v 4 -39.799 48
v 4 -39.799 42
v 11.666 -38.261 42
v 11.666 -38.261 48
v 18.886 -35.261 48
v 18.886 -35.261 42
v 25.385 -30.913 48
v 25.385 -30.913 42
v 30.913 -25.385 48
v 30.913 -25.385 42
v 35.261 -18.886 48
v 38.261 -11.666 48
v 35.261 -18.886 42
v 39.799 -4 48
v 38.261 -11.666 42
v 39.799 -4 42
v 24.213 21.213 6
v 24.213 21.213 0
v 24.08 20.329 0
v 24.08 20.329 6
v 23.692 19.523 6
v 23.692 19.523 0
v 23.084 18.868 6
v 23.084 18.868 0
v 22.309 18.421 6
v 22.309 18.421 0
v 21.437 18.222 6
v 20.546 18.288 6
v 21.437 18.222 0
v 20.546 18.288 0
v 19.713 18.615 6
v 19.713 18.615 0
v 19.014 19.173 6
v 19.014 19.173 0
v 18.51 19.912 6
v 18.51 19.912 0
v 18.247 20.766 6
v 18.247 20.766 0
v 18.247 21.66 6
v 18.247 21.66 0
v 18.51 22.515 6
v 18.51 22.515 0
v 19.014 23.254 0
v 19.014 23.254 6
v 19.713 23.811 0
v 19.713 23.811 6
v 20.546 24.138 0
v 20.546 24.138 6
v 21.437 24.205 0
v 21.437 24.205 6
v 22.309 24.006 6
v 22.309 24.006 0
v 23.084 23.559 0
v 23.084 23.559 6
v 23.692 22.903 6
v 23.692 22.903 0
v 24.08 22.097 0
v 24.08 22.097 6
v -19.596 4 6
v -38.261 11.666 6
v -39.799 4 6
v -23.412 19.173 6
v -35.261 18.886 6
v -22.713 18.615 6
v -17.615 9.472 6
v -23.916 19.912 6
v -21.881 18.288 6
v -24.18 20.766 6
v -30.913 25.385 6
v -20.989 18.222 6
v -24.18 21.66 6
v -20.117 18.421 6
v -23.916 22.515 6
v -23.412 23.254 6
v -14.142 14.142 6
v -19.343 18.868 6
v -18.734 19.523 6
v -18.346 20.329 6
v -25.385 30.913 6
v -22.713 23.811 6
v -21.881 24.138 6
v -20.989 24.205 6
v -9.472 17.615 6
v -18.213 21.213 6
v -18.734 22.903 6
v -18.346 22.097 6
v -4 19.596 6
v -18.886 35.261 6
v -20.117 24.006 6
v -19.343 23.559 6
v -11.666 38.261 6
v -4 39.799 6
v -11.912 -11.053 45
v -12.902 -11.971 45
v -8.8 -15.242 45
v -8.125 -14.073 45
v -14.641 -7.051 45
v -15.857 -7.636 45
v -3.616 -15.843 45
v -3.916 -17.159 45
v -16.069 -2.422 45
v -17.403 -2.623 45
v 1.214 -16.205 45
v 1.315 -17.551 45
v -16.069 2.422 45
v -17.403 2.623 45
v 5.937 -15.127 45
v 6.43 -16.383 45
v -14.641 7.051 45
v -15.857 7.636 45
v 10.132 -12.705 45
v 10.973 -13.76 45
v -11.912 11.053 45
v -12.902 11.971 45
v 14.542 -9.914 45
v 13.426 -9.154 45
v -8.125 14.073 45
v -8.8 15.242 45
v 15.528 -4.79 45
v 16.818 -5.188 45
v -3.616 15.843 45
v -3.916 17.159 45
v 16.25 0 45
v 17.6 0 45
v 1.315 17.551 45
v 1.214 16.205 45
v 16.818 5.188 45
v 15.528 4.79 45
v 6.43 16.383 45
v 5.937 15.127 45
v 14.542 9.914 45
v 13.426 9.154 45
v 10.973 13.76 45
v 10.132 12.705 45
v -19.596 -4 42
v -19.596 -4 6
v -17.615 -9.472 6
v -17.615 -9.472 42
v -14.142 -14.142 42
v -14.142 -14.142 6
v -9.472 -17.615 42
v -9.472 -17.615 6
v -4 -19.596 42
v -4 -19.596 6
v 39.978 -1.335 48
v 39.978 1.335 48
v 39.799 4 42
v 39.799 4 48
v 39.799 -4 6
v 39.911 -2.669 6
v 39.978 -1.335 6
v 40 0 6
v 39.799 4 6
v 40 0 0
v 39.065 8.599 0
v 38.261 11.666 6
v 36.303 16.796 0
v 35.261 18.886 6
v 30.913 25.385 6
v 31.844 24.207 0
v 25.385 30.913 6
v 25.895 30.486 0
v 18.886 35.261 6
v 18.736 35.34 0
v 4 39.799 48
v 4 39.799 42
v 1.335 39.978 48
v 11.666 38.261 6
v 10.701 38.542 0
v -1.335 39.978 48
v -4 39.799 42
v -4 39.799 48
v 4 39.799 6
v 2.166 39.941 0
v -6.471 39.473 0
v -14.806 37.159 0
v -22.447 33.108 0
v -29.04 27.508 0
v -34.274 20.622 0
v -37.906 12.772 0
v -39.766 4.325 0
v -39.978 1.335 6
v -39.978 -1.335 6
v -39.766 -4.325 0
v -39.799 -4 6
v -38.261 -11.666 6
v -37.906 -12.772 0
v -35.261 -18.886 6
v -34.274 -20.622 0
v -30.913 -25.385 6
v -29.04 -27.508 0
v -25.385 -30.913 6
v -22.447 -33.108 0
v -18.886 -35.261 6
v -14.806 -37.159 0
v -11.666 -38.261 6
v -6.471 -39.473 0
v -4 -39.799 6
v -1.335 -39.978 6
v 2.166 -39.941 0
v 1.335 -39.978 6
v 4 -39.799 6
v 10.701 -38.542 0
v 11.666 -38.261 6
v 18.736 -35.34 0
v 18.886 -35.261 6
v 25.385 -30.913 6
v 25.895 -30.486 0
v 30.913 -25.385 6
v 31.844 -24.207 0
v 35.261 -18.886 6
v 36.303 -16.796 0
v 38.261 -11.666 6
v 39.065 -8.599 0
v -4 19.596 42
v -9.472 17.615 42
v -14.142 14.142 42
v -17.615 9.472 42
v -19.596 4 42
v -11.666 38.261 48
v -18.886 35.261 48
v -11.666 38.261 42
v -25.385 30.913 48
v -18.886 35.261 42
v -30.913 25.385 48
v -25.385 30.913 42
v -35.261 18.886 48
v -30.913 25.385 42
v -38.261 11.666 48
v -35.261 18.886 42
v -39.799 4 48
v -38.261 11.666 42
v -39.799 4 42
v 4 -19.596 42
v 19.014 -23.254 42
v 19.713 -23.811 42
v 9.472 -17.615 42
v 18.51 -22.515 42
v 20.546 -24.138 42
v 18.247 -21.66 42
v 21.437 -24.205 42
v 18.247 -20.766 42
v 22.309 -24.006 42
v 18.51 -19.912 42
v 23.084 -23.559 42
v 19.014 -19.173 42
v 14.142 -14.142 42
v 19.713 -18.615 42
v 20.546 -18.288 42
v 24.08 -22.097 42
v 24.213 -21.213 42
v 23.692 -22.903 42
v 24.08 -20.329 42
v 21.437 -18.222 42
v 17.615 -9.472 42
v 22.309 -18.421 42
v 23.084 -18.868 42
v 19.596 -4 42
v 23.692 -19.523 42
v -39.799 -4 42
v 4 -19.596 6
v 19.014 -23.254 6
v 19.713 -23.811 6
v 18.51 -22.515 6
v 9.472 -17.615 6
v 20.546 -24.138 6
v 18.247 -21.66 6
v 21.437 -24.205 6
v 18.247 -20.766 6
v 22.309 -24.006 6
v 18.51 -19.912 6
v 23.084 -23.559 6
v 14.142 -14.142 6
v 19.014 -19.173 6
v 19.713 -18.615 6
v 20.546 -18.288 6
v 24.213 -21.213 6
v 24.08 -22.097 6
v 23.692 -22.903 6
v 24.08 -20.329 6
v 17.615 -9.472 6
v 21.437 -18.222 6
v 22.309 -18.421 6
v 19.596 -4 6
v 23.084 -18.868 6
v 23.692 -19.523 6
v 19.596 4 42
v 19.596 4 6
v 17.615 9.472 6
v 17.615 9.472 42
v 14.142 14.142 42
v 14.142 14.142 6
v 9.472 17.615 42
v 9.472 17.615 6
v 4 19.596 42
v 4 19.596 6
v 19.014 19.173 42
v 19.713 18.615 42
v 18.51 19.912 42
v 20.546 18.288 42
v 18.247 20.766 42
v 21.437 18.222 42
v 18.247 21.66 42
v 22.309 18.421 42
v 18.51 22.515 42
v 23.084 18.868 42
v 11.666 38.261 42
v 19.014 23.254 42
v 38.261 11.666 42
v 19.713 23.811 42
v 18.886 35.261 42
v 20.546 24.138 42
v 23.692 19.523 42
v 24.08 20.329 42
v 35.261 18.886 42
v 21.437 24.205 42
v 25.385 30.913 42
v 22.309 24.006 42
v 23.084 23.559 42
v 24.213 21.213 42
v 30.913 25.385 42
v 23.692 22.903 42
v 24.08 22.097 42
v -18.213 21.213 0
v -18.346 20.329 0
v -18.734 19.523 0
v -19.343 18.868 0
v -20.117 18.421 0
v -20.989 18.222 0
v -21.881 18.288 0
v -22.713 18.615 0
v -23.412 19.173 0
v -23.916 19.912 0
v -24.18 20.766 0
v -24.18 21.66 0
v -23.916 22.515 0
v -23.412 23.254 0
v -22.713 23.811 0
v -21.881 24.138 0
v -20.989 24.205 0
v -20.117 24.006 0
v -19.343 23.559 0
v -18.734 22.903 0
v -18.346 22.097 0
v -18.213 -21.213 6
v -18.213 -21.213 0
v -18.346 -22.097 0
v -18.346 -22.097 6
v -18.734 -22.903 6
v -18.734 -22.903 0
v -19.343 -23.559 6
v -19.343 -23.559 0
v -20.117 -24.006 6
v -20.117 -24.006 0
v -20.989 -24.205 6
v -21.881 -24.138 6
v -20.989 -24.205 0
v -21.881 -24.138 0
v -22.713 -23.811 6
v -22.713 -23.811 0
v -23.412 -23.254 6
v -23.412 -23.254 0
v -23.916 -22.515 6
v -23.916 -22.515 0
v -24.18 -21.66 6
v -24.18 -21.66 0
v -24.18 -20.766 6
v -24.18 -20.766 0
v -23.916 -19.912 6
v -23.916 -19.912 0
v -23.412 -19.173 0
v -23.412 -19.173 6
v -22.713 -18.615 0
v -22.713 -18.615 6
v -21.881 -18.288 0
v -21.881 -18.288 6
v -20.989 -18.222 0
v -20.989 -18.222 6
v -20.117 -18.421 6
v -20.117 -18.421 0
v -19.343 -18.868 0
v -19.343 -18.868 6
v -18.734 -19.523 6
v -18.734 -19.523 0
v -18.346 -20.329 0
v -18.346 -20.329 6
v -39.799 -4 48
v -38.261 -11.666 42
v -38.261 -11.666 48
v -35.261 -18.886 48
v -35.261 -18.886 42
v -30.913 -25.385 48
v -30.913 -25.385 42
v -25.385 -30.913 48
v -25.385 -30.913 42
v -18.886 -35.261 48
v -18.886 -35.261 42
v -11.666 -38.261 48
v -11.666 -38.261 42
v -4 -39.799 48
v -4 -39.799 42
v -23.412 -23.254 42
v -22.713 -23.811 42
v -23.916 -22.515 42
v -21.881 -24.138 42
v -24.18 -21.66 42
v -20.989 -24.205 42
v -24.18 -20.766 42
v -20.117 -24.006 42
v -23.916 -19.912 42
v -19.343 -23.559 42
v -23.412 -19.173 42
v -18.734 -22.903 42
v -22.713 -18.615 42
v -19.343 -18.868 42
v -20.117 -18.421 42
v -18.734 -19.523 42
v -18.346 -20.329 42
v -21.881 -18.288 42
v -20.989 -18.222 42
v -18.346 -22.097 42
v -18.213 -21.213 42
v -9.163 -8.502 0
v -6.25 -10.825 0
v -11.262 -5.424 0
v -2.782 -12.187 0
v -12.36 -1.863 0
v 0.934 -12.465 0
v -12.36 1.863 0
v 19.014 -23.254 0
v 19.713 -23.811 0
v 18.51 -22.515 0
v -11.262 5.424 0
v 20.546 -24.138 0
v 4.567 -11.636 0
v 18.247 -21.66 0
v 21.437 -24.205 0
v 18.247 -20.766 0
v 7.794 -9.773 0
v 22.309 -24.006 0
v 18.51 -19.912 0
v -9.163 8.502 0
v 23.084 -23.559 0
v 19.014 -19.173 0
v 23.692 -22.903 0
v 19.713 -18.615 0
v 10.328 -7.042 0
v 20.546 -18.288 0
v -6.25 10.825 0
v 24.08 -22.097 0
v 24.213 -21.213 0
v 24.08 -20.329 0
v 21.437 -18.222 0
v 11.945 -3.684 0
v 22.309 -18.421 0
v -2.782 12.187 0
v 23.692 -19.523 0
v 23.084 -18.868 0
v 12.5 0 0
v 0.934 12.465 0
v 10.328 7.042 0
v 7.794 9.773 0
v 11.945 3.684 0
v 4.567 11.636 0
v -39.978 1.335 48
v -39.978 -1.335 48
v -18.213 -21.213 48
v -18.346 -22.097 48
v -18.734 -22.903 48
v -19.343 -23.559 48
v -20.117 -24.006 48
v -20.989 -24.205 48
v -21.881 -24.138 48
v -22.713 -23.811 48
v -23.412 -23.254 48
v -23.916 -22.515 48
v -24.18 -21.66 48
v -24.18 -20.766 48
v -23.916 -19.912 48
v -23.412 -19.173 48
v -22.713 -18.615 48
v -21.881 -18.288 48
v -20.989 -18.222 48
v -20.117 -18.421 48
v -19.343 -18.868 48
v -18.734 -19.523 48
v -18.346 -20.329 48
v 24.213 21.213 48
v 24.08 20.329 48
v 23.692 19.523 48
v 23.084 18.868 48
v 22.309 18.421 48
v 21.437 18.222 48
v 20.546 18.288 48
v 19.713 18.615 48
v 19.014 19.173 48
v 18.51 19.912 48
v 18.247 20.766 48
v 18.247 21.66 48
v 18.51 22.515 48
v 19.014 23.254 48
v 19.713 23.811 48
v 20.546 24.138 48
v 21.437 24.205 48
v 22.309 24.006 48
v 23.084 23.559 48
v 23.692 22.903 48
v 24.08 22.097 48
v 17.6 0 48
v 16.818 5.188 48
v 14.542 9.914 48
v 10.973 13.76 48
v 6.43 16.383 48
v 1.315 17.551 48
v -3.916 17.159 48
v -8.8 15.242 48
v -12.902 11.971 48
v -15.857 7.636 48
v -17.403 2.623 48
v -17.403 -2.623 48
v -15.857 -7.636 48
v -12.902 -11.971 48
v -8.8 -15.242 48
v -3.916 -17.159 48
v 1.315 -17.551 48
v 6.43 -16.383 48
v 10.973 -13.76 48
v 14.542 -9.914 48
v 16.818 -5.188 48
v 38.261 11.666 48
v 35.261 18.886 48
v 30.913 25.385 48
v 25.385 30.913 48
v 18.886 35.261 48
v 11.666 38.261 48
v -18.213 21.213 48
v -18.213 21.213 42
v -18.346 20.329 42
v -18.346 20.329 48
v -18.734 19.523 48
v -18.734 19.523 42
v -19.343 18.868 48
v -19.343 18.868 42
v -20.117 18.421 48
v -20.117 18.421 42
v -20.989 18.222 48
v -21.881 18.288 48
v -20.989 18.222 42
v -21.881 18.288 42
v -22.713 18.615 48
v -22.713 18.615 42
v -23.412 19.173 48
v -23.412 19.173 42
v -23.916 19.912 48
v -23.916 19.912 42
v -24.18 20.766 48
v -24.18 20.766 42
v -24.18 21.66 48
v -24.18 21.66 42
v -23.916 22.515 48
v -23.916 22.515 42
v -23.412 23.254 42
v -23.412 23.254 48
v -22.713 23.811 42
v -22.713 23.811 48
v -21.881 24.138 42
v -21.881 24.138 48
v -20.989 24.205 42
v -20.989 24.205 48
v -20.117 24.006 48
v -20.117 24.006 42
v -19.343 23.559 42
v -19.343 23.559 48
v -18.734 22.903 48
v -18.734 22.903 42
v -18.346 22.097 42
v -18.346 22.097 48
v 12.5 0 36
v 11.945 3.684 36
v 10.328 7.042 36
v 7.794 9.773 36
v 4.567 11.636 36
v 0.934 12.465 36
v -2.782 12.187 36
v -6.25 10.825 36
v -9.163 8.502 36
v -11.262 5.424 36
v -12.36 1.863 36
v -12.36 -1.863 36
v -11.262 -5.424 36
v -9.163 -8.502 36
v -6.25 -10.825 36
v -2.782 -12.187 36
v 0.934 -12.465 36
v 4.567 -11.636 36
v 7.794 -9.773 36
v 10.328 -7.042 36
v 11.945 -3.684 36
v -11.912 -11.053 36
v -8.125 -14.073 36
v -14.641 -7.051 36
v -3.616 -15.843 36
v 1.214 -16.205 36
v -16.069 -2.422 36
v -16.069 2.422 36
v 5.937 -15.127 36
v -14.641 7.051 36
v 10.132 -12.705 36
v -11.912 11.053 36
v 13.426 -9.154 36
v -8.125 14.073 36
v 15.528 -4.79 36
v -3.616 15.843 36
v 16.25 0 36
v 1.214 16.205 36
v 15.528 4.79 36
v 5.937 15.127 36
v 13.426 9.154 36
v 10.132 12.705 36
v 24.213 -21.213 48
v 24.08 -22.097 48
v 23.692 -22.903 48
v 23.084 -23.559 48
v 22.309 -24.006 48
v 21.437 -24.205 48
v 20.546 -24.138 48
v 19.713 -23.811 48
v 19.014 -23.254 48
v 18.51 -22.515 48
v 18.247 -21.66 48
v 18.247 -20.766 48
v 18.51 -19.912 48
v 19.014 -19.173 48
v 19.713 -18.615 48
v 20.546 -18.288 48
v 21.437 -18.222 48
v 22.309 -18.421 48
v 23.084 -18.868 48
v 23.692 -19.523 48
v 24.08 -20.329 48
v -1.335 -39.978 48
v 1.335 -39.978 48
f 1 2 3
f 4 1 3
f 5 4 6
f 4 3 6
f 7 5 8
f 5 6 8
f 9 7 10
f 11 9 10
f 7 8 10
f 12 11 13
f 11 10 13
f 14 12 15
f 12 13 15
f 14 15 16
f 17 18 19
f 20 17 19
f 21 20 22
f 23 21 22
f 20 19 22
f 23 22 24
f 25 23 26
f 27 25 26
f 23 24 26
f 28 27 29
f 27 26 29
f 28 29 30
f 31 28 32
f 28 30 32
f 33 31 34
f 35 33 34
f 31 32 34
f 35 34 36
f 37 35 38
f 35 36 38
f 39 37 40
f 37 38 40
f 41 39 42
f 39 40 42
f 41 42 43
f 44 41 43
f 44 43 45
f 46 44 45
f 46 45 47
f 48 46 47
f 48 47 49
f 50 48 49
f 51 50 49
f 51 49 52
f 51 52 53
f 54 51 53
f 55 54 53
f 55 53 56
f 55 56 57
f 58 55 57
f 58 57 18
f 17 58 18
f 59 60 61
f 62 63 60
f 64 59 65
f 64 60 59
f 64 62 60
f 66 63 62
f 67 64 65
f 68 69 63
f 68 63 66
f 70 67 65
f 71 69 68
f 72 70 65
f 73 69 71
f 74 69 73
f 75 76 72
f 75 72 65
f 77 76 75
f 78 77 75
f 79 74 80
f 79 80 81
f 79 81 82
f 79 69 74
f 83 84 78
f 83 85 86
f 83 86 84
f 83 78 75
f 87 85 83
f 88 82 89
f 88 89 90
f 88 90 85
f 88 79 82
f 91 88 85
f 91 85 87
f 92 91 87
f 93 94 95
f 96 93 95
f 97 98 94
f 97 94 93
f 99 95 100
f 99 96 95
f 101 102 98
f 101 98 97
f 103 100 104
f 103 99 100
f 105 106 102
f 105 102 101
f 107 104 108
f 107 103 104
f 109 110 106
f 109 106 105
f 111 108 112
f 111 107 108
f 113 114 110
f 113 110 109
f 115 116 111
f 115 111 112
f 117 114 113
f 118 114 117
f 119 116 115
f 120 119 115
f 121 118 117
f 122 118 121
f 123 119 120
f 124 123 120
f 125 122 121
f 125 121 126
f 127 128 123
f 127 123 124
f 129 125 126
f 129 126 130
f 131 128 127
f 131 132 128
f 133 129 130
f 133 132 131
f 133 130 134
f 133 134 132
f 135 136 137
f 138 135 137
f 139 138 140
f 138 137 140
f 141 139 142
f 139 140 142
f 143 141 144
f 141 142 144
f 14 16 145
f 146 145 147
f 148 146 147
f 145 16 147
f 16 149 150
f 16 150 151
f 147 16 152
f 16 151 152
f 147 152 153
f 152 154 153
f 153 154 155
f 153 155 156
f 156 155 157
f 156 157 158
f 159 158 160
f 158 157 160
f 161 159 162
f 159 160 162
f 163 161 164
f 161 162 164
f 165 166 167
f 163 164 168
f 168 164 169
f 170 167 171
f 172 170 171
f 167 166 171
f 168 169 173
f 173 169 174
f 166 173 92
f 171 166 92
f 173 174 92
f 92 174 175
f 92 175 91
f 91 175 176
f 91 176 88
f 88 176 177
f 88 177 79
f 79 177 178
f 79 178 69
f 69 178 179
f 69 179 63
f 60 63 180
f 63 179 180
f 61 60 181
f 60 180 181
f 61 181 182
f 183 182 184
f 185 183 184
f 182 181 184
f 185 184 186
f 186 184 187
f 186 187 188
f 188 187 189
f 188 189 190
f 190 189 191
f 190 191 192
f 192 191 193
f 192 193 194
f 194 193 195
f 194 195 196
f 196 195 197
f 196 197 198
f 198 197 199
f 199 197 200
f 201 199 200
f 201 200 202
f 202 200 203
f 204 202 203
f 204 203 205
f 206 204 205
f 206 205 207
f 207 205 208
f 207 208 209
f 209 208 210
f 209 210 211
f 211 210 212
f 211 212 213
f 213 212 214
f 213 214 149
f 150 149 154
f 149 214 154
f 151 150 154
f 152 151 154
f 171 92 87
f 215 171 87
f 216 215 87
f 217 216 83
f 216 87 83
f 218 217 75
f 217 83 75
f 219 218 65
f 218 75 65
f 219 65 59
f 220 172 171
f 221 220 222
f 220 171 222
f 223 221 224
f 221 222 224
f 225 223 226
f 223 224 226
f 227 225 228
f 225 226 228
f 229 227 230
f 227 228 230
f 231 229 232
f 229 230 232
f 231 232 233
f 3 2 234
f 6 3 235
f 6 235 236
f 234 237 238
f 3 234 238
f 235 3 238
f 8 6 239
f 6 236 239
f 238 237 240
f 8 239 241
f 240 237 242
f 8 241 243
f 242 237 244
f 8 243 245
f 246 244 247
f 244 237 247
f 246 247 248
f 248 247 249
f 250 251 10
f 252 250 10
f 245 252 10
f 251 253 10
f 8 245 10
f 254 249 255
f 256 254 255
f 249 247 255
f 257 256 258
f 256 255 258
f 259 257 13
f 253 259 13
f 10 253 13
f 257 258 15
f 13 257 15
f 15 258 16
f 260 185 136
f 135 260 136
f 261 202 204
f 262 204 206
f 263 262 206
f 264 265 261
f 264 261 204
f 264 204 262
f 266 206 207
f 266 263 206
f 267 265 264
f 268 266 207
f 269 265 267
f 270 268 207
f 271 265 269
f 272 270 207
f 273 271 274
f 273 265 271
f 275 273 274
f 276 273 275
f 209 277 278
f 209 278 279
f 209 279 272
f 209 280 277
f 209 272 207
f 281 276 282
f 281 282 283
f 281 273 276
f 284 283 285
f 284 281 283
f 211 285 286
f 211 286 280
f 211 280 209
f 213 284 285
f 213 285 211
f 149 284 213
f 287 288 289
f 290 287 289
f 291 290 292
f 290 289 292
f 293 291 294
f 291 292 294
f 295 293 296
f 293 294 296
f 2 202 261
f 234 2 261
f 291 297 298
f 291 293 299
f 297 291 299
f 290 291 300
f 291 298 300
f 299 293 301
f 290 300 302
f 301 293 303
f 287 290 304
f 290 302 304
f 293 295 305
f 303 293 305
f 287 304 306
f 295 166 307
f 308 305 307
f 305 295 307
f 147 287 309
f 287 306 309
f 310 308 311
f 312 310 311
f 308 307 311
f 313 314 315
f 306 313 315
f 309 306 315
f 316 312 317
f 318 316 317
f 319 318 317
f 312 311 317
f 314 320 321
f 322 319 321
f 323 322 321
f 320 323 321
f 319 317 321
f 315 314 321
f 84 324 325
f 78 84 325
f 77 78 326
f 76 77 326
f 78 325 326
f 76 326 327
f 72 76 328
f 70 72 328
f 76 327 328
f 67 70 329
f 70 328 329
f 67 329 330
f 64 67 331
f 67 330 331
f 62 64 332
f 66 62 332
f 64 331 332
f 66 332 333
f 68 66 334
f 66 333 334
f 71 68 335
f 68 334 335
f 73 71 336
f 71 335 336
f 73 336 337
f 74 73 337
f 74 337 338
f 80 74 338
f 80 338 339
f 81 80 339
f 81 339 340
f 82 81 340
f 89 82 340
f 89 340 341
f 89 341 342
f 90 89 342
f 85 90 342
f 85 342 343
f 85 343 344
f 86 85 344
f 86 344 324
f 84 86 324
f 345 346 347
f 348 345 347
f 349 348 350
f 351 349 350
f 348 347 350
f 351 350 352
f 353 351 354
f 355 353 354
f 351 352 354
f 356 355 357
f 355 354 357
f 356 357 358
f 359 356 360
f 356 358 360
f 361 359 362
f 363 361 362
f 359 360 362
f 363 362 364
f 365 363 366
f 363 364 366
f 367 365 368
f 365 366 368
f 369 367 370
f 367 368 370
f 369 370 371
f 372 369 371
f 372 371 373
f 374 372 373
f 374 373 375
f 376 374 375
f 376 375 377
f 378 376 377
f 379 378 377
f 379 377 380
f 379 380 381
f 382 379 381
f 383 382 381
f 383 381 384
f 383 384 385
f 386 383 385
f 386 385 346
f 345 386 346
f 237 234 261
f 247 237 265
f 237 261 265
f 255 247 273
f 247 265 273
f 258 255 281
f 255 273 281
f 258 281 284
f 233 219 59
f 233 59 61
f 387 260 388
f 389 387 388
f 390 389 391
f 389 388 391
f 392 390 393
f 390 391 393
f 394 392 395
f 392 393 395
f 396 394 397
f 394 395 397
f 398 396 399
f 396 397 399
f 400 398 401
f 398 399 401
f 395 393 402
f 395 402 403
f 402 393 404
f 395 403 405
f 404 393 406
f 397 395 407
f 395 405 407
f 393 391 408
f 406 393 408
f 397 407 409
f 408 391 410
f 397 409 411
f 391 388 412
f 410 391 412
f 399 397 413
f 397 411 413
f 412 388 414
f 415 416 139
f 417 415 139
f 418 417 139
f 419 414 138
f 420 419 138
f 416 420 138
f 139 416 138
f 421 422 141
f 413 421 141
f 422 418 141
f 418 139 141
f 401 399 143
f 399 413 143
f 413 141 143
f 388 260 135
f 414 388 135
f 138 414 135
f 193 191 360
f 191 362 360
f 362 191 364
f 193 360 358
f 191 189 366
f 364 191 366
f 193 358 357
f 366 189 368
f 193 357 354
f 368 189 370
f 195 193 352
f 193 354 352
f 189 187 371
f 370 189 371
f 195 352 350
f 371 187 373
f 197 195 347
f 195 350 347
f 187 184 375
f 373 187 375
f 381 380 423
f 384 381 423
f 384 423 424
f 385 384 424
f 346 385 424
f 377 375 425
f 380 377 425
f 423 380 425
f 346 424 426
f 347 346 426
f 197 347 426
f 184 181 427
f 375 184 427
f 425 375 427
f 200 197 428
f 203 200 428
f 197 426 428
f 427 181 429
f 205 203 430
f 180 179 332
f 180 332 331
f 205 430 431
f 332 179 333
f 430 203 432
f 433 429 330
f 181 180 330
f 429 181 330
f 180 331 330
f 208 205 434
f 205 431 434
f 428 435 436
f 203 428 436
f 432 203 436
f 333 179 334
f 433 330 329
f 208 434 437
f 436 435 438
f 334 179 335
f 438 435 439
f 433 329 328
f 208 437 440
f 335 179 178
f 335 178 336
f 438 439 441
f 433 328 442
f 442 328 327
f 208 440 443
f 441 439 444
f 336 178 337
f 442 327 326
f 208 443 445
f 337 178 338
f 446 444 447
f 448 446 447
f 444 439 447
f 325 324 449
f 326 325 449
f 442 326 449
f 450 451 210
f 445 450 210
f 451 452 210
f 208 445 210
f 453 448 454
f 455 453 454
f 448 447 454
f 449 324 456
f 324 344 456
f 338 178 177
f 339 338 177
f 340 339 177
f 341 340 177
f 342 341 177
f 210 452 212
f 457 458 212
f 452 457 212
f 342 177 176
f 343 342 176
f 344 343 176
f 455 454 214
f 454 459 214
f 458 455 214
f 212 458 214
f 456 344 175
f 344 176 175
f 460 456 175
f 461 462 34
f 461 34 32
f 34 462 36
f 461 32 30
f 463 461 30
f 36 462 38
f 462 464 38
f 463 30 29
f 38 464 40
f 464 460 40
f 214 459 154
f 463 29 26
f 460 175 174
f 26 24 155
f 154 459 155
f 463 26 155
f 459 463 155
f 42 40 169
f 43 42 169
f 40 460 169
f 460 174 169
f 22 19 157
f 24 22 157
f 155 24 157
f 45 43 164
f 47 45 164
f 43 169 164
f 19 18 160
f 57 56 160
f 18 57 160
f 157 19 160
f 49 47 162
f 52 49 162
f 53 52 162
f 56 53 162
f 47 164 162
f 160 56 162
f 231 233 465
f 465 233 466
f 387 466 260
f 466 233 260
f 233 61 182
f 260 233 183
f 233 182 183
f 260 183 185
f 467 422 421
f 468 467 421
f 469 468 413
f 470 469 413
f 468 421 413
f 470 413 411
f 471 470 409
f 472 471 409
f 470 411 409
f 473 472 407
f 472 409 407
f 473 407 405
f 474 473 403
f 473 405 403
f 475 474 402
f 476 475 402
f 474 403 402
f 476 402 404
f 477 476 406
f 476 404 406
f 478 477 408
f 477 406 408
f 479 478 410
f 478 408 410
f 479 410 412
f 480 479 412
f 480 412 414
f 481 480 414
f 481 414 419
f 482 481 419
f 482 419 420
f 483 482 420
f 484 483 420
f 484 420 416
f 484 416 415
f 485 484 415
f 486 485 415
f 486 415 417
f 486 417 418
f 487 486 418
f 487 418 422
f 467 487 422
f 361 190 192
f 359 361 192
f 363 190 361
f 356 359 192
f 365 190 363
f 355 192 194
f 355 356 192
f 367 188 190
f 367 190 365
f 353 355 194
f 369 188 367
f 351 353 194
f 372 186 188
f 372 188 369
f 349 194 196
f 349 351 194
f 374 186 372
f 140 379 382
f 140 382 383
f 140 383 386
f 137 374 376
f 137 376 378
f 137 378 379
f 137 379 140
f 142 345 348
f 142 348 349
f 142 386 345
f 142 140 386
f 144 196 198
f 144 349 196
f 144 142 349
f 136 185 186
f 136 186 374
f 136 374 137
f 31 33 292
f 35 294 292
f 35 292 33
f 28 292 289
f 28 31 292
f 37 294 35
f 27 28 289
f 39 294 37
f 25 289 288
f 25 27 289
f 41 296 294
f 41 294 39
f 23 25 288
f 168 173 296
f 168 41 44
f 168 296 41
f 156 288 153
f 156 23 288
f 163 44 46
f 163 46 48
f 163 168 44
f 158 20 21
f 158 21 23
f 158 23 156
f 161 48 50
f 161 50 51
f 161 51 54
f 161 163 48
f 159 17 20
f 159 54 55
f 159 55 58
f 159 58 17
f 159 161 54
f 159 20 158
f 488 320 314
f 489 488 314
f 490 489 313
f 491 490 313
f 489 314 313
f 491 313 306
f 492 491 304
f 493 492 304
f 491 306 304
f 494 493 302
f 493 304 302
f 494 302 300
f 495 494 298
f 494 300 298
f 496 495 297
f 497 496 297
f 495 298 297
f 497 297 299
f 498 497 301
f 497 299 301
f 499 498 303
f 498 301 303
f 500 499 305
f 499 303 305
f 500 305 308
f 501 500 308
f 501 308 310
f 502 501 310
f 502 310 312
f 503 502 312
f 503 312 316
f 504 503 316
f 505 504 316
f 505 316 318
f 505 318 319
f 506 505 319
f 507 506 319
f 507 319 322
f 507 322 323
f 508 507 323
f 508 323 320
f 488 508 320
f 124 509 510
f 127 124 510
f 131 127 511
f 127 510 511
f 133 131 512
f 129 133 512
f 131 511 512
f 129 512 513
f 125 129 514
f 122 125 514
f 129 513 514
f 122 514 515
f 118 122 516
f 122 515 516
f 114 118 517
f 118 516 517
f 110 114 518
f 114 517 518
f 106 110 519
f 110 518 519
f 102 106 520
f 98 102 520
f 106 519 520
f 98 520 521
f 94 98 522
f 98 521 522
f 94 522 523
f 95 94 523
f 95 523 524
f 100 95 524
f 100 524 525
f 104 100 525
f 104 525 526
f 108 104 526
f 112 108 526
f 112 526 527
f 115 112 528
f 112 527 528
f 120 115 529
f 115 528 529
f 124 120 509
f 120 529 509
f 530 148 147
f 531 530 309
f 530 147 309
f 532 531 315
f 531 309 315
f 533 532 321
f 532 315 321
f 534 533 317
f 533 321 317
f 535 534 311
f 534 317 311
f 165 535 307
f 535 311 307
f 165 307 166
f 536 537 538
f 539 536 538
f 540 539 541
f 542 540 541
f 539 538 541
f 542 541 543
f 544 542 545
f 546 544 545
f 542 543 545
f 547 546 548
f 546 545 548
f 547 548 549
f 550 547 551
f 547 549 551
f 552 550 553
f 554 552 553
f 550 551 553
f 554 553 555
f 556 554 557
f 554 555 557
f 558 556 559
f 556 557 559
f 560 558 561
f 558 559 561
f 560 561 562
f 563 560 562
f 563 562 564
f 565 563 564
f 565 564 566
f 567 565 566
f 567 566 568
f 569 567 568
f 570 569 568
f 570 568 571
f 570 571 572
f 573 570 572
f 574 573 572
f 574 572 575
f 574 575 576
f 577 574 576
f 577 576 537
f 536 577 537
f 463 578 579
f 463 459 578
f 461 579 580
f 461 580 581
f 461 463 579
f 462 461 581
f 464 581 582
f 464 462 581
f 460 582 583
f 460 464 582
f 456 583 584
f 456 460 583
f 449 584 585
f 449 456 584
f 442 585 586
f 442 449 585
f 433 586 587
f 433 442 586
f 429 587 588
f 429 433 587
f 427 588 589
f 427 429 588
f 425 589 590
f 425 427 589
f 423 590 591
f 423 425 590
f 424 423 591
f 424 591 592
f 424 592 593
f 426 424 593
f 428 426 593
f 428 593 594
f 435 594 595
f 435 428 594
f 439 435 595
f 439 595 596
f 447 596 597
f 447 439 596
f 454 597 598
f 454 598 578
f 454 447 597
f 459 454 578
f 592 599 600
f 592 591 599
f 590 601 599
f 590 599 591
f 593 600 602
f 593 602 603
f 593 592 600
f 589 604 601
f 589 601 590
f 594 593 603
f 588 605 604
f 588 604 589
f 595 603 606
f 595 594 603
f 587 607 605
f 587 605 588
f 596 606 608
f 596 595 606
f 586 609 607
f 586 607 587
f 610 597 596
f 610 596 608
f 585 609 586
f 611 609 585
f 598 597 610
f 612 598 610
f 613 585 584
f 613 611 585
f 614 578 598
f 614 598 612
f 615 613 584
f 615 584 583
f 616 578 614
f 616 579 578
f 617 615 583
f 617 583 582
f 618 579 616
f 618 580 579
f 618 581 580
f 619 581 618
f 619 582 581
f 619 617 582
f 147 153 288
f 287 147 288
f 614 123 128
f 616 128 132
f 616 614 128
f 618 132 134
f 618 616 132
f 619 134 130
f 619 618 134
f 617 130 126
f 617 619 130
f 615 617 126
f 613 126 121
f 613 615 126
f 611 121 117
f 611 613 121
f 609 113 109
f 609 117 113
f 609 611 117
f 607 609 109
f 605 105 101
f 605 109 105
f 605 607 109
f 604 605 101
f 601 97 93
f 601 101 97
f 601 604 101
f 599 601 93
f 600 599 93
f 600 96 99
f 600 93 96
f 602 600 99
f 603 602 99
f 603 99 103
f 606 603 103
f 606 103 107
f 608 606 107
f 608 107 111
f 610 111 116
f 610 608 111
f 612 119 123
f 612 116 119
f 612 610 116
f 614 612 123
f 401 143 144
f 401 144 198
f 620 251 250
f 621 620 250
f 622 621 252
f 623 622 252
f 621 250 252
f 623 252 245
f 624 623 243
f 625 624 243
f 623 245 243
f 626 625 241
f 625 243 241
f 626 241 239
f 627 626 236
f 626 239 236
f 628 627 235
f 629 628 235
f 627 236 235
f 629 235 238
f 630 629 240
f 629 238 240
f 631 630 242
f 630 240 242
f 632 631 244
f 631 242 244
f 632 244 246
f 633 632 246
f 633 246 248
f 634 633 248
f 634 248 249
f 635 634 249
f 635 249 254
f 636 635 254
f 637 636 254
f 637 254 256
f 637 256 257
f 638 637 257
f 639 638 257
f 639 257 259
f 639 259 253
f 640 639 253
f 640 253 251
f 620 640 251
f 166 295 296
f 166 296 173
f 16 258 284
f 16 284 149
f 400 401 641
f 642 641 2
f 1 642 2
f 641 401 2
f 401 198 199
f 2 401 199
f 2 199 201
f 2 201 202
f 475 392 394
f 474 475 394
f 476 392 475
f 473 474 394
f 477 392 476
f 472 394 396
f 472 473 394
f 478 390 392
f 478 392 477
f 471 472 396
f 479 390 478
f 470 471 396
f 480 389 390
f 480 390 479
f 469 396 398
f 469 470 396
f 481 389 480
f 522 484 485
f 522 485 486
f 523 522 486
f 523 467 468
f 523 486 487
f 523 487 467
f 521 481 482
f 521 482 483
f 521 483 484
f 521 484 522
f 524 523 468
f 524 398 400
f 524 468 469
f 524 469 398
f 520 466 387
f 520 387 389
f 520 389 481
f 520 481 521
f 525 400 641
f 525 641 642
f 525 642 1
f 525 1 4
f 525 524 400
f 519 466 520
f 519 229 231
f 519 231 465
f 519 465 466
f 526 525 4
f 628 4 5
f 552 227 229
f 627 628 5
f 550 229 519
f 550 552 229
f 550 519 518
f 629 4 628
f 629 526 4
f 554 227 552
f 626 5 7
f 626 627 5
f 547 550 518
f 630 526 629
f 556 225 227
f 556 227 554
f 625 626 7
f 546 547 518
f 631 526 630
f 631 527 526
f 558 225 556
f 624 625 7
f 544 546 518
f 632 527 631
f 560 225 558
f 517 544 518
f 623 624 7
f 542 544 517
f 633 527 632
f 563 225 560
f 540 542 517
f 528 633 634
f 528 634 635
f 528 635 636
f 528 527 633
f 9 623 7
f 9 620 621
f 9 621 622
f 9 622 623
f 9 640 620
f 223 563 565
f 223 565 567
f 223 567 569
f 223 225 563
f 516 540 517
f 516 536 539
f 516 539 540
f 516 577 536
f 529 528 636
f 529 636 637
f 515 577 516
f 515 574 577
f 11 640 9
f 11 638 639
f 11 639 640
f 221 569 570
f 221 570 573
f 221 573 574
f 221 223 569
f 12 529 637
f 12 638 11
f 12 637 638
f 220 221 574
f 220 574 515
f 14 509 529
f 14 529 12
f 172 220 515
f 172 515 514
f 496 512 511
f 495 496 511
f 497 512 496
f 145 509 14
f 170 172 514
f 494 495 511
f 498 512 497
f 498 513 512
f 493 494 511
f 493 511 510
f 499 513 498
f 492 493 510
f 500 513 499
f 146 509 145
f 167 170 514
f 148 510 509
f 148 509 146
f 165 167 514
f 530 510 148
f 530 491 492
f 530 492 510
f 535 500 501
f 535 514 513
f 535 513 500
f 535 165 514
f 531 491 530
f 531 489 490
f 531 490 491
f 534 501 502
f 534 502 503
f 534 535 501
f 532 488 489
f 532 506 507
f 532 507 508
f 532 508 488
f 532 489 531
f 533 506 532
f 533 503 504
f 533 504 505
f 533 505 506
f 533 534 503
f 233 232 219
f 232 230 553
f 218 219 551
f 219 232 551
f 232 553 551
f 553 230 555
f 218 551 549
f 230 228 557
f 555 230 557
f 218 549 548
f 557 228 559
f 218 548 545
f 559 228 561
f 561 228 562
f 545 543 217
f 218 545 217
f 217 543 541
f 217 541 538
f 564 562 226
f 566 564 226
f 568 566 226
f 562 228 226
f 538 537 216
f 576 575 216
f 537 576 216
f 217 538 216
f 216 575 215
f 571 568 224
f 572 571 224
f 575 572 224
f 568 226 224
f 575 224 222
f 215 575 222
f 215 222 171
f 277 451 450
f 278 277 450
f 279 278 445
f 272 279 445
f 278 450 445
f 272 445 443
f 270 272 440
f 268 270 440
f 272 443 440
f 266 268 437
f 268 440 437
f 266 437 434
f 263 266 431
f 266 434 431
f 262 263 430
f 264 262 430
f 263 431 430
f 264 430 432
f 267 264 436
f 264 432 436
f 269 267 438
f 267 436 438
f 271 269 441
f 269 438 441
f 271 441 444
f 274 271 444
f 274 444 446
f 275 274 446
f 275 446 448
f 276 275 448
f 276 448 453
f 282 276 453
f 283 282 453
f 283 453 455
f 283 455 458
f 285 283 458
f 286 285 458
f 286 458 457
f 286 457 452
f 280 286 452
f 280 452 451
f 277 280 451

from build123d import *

# Parameters (mm, degrees)
SKETCH1_R            = 40
SKETCH1_R_2          = 12.5
BOSS_EXTRUDE1_DEPTH  = 6
SKETCH2_R            = 20
SKETCH2_R_2          = 12.5
BOSS_EXTRUDE2_DEPTH  = 30
SKETCH6_R            = 20
SKETCH6_R_2          = 16.25
BOSS_EXTRUDE5_DEPTH  = 12
BOSS_EXTRUDE6_DEPTH  = 42
SKETCH9_R            = 17.6
CUT_EXTRUDE1_DEPTH   = 3
BOSS_EXTRUDE14_START = -6
SKETCH11_R           = 40
SKETCH11_R_2         = 20
BOSS_EXTRUDE14_DEPTH = 6
SKETCH12_R           = 3
CUT_EXTRUDE2_DEPTH   = 78


with BuildPart() as part:
    # Sketch1 → Boss-Extrude1 (new body)
    with BuildSketch(Plane.XY):
        Circle(SKETCH1_R)
        Circle(SKETCH1_R_2, mode=Mode.SUBTRACT)
    extrude(amount=BOSS_EXTRUDE1_DEPTH)

    # Sketch2 → Boss-Extrude2 (add)
    with BuildSketch(Plane.XY.offset(6)):
        Circle(SKETCH2_R)
        Circle(SKETCH2_R_2, mode=Mode.SUBTRACT)
    extrude(amount=BOSS_EXTRUDE2_DEPTH)

    # Sketch6 → Boss-Extrude5 (add)
    with BuildSketch(Plane.XY.offset(36)):
        Circle(SKETCH6_R)
        Circle(SKETCH6_R_2, mode=Mode.SUBTRACT)
    extrude(amount=BOSS_EXTRUDE5_DEPTH)

    # Sketch8 → Boss-Extrude6 (add)
    with BuildSketch(Plane.XY.offset(6)):
        with BuildLine():
            Line((4, -39.799497484), (4, -19.595917942))
            ThreePointArc((4, -19.595917942), (0, -20), (-4, -19.595917942))
            Line((-4, -19.595917942), (-4, -39.799497484))
            ThreePointArc((-4, -39.799497484), (0, -40), (4, -39.799497484))
        make_face()
        with BuildLine():
            Line((39.799497484, 4), (19.595917942, 4))
            ThreePointArc((19.595917942, 4), (20, 0), (19.595917942, -4))
            Line((19.595917942, -4), (39.799497484, -4))
            ThreePointArc((39.799497484, -4), (40, 0), (39.799497484, 4))
        make_face()
        with BuildLine():
            Line((-39.799497484, -4), (-19.595917942, -4))
            ThreePointArc((-19.595917942, -4), (-20, 0), (-19.595917942, 4))
            Line((-19.595917942, 4), (-39.799497484, 4))
            ThreePointArc((-39.799497484, 4), (-40, 0), (-39.799497484, -4))
        make_face()
        with BuildLine():
            Line((-4, 39.799497484), (-4, 19.595917942))
            ThreePointArc((-4, 19.595917942), (0, 20), (4, 19.595917942))
            Line((4, 19.595917942), (4, 39.799497484))
            ThreePointArc((4, 39.799497484), (0, 40), (-4, 39.799497484))
        make_face()
    extrude(amount=BOSS_EXTRUDE6_DEPTH)

    # Sketch9 → Cut-Extrude1 (cut)
    with BuildSketch(Plane.XY.offset(48)):
        Circle(SKETCH9_R)
    extrude(amount=-CUT_EXTRUDE1_DEPTH, mode=Mode.SUBTRACT)

    # Sketch11 → Boss-Extrude14 (add)
    with BuildSketch(Plane.XY.offset(48).offset(BOSS_EXTRUDE14_START)):
        Circle(SKETCH11_R)
        Circle(SKETCH11_R_2, mode=Mode.SUBTRACT)
    extrude(amount=BOSS_EXTRUDE14_DEPTH)

    # Sketch12 → Cut-Extrude2 (cut)
    with BuildSketch(Plane(origin=(0, 0, 0), x_dir=(-1, 0, 0), z_dir=(0, 0, -1))):
        with Locations(Location((-21.213203436, 21.213203436, 0), (0, 0, 180))):
            Circle(SKETCH12_R)
        with Locations(Location((21.213203436, 21.213203436, 0), (0, 0, 180))):
            Circle(SKETCH12_R)
        with Locations(Location((21.213203436, -21.213203436, 0), (0, 0, 180))):
            Circle(SKETCH12_R)
        with Locations(Location((-21.213203436, -21.213203436, 0), (0, 0, 180))):
            Circle(SKETCH12_R)
    extrude(amount=-CUT_EXTRUDE2_DEPTH, mode=Mode.SUBTRACT)


solid = part.part
